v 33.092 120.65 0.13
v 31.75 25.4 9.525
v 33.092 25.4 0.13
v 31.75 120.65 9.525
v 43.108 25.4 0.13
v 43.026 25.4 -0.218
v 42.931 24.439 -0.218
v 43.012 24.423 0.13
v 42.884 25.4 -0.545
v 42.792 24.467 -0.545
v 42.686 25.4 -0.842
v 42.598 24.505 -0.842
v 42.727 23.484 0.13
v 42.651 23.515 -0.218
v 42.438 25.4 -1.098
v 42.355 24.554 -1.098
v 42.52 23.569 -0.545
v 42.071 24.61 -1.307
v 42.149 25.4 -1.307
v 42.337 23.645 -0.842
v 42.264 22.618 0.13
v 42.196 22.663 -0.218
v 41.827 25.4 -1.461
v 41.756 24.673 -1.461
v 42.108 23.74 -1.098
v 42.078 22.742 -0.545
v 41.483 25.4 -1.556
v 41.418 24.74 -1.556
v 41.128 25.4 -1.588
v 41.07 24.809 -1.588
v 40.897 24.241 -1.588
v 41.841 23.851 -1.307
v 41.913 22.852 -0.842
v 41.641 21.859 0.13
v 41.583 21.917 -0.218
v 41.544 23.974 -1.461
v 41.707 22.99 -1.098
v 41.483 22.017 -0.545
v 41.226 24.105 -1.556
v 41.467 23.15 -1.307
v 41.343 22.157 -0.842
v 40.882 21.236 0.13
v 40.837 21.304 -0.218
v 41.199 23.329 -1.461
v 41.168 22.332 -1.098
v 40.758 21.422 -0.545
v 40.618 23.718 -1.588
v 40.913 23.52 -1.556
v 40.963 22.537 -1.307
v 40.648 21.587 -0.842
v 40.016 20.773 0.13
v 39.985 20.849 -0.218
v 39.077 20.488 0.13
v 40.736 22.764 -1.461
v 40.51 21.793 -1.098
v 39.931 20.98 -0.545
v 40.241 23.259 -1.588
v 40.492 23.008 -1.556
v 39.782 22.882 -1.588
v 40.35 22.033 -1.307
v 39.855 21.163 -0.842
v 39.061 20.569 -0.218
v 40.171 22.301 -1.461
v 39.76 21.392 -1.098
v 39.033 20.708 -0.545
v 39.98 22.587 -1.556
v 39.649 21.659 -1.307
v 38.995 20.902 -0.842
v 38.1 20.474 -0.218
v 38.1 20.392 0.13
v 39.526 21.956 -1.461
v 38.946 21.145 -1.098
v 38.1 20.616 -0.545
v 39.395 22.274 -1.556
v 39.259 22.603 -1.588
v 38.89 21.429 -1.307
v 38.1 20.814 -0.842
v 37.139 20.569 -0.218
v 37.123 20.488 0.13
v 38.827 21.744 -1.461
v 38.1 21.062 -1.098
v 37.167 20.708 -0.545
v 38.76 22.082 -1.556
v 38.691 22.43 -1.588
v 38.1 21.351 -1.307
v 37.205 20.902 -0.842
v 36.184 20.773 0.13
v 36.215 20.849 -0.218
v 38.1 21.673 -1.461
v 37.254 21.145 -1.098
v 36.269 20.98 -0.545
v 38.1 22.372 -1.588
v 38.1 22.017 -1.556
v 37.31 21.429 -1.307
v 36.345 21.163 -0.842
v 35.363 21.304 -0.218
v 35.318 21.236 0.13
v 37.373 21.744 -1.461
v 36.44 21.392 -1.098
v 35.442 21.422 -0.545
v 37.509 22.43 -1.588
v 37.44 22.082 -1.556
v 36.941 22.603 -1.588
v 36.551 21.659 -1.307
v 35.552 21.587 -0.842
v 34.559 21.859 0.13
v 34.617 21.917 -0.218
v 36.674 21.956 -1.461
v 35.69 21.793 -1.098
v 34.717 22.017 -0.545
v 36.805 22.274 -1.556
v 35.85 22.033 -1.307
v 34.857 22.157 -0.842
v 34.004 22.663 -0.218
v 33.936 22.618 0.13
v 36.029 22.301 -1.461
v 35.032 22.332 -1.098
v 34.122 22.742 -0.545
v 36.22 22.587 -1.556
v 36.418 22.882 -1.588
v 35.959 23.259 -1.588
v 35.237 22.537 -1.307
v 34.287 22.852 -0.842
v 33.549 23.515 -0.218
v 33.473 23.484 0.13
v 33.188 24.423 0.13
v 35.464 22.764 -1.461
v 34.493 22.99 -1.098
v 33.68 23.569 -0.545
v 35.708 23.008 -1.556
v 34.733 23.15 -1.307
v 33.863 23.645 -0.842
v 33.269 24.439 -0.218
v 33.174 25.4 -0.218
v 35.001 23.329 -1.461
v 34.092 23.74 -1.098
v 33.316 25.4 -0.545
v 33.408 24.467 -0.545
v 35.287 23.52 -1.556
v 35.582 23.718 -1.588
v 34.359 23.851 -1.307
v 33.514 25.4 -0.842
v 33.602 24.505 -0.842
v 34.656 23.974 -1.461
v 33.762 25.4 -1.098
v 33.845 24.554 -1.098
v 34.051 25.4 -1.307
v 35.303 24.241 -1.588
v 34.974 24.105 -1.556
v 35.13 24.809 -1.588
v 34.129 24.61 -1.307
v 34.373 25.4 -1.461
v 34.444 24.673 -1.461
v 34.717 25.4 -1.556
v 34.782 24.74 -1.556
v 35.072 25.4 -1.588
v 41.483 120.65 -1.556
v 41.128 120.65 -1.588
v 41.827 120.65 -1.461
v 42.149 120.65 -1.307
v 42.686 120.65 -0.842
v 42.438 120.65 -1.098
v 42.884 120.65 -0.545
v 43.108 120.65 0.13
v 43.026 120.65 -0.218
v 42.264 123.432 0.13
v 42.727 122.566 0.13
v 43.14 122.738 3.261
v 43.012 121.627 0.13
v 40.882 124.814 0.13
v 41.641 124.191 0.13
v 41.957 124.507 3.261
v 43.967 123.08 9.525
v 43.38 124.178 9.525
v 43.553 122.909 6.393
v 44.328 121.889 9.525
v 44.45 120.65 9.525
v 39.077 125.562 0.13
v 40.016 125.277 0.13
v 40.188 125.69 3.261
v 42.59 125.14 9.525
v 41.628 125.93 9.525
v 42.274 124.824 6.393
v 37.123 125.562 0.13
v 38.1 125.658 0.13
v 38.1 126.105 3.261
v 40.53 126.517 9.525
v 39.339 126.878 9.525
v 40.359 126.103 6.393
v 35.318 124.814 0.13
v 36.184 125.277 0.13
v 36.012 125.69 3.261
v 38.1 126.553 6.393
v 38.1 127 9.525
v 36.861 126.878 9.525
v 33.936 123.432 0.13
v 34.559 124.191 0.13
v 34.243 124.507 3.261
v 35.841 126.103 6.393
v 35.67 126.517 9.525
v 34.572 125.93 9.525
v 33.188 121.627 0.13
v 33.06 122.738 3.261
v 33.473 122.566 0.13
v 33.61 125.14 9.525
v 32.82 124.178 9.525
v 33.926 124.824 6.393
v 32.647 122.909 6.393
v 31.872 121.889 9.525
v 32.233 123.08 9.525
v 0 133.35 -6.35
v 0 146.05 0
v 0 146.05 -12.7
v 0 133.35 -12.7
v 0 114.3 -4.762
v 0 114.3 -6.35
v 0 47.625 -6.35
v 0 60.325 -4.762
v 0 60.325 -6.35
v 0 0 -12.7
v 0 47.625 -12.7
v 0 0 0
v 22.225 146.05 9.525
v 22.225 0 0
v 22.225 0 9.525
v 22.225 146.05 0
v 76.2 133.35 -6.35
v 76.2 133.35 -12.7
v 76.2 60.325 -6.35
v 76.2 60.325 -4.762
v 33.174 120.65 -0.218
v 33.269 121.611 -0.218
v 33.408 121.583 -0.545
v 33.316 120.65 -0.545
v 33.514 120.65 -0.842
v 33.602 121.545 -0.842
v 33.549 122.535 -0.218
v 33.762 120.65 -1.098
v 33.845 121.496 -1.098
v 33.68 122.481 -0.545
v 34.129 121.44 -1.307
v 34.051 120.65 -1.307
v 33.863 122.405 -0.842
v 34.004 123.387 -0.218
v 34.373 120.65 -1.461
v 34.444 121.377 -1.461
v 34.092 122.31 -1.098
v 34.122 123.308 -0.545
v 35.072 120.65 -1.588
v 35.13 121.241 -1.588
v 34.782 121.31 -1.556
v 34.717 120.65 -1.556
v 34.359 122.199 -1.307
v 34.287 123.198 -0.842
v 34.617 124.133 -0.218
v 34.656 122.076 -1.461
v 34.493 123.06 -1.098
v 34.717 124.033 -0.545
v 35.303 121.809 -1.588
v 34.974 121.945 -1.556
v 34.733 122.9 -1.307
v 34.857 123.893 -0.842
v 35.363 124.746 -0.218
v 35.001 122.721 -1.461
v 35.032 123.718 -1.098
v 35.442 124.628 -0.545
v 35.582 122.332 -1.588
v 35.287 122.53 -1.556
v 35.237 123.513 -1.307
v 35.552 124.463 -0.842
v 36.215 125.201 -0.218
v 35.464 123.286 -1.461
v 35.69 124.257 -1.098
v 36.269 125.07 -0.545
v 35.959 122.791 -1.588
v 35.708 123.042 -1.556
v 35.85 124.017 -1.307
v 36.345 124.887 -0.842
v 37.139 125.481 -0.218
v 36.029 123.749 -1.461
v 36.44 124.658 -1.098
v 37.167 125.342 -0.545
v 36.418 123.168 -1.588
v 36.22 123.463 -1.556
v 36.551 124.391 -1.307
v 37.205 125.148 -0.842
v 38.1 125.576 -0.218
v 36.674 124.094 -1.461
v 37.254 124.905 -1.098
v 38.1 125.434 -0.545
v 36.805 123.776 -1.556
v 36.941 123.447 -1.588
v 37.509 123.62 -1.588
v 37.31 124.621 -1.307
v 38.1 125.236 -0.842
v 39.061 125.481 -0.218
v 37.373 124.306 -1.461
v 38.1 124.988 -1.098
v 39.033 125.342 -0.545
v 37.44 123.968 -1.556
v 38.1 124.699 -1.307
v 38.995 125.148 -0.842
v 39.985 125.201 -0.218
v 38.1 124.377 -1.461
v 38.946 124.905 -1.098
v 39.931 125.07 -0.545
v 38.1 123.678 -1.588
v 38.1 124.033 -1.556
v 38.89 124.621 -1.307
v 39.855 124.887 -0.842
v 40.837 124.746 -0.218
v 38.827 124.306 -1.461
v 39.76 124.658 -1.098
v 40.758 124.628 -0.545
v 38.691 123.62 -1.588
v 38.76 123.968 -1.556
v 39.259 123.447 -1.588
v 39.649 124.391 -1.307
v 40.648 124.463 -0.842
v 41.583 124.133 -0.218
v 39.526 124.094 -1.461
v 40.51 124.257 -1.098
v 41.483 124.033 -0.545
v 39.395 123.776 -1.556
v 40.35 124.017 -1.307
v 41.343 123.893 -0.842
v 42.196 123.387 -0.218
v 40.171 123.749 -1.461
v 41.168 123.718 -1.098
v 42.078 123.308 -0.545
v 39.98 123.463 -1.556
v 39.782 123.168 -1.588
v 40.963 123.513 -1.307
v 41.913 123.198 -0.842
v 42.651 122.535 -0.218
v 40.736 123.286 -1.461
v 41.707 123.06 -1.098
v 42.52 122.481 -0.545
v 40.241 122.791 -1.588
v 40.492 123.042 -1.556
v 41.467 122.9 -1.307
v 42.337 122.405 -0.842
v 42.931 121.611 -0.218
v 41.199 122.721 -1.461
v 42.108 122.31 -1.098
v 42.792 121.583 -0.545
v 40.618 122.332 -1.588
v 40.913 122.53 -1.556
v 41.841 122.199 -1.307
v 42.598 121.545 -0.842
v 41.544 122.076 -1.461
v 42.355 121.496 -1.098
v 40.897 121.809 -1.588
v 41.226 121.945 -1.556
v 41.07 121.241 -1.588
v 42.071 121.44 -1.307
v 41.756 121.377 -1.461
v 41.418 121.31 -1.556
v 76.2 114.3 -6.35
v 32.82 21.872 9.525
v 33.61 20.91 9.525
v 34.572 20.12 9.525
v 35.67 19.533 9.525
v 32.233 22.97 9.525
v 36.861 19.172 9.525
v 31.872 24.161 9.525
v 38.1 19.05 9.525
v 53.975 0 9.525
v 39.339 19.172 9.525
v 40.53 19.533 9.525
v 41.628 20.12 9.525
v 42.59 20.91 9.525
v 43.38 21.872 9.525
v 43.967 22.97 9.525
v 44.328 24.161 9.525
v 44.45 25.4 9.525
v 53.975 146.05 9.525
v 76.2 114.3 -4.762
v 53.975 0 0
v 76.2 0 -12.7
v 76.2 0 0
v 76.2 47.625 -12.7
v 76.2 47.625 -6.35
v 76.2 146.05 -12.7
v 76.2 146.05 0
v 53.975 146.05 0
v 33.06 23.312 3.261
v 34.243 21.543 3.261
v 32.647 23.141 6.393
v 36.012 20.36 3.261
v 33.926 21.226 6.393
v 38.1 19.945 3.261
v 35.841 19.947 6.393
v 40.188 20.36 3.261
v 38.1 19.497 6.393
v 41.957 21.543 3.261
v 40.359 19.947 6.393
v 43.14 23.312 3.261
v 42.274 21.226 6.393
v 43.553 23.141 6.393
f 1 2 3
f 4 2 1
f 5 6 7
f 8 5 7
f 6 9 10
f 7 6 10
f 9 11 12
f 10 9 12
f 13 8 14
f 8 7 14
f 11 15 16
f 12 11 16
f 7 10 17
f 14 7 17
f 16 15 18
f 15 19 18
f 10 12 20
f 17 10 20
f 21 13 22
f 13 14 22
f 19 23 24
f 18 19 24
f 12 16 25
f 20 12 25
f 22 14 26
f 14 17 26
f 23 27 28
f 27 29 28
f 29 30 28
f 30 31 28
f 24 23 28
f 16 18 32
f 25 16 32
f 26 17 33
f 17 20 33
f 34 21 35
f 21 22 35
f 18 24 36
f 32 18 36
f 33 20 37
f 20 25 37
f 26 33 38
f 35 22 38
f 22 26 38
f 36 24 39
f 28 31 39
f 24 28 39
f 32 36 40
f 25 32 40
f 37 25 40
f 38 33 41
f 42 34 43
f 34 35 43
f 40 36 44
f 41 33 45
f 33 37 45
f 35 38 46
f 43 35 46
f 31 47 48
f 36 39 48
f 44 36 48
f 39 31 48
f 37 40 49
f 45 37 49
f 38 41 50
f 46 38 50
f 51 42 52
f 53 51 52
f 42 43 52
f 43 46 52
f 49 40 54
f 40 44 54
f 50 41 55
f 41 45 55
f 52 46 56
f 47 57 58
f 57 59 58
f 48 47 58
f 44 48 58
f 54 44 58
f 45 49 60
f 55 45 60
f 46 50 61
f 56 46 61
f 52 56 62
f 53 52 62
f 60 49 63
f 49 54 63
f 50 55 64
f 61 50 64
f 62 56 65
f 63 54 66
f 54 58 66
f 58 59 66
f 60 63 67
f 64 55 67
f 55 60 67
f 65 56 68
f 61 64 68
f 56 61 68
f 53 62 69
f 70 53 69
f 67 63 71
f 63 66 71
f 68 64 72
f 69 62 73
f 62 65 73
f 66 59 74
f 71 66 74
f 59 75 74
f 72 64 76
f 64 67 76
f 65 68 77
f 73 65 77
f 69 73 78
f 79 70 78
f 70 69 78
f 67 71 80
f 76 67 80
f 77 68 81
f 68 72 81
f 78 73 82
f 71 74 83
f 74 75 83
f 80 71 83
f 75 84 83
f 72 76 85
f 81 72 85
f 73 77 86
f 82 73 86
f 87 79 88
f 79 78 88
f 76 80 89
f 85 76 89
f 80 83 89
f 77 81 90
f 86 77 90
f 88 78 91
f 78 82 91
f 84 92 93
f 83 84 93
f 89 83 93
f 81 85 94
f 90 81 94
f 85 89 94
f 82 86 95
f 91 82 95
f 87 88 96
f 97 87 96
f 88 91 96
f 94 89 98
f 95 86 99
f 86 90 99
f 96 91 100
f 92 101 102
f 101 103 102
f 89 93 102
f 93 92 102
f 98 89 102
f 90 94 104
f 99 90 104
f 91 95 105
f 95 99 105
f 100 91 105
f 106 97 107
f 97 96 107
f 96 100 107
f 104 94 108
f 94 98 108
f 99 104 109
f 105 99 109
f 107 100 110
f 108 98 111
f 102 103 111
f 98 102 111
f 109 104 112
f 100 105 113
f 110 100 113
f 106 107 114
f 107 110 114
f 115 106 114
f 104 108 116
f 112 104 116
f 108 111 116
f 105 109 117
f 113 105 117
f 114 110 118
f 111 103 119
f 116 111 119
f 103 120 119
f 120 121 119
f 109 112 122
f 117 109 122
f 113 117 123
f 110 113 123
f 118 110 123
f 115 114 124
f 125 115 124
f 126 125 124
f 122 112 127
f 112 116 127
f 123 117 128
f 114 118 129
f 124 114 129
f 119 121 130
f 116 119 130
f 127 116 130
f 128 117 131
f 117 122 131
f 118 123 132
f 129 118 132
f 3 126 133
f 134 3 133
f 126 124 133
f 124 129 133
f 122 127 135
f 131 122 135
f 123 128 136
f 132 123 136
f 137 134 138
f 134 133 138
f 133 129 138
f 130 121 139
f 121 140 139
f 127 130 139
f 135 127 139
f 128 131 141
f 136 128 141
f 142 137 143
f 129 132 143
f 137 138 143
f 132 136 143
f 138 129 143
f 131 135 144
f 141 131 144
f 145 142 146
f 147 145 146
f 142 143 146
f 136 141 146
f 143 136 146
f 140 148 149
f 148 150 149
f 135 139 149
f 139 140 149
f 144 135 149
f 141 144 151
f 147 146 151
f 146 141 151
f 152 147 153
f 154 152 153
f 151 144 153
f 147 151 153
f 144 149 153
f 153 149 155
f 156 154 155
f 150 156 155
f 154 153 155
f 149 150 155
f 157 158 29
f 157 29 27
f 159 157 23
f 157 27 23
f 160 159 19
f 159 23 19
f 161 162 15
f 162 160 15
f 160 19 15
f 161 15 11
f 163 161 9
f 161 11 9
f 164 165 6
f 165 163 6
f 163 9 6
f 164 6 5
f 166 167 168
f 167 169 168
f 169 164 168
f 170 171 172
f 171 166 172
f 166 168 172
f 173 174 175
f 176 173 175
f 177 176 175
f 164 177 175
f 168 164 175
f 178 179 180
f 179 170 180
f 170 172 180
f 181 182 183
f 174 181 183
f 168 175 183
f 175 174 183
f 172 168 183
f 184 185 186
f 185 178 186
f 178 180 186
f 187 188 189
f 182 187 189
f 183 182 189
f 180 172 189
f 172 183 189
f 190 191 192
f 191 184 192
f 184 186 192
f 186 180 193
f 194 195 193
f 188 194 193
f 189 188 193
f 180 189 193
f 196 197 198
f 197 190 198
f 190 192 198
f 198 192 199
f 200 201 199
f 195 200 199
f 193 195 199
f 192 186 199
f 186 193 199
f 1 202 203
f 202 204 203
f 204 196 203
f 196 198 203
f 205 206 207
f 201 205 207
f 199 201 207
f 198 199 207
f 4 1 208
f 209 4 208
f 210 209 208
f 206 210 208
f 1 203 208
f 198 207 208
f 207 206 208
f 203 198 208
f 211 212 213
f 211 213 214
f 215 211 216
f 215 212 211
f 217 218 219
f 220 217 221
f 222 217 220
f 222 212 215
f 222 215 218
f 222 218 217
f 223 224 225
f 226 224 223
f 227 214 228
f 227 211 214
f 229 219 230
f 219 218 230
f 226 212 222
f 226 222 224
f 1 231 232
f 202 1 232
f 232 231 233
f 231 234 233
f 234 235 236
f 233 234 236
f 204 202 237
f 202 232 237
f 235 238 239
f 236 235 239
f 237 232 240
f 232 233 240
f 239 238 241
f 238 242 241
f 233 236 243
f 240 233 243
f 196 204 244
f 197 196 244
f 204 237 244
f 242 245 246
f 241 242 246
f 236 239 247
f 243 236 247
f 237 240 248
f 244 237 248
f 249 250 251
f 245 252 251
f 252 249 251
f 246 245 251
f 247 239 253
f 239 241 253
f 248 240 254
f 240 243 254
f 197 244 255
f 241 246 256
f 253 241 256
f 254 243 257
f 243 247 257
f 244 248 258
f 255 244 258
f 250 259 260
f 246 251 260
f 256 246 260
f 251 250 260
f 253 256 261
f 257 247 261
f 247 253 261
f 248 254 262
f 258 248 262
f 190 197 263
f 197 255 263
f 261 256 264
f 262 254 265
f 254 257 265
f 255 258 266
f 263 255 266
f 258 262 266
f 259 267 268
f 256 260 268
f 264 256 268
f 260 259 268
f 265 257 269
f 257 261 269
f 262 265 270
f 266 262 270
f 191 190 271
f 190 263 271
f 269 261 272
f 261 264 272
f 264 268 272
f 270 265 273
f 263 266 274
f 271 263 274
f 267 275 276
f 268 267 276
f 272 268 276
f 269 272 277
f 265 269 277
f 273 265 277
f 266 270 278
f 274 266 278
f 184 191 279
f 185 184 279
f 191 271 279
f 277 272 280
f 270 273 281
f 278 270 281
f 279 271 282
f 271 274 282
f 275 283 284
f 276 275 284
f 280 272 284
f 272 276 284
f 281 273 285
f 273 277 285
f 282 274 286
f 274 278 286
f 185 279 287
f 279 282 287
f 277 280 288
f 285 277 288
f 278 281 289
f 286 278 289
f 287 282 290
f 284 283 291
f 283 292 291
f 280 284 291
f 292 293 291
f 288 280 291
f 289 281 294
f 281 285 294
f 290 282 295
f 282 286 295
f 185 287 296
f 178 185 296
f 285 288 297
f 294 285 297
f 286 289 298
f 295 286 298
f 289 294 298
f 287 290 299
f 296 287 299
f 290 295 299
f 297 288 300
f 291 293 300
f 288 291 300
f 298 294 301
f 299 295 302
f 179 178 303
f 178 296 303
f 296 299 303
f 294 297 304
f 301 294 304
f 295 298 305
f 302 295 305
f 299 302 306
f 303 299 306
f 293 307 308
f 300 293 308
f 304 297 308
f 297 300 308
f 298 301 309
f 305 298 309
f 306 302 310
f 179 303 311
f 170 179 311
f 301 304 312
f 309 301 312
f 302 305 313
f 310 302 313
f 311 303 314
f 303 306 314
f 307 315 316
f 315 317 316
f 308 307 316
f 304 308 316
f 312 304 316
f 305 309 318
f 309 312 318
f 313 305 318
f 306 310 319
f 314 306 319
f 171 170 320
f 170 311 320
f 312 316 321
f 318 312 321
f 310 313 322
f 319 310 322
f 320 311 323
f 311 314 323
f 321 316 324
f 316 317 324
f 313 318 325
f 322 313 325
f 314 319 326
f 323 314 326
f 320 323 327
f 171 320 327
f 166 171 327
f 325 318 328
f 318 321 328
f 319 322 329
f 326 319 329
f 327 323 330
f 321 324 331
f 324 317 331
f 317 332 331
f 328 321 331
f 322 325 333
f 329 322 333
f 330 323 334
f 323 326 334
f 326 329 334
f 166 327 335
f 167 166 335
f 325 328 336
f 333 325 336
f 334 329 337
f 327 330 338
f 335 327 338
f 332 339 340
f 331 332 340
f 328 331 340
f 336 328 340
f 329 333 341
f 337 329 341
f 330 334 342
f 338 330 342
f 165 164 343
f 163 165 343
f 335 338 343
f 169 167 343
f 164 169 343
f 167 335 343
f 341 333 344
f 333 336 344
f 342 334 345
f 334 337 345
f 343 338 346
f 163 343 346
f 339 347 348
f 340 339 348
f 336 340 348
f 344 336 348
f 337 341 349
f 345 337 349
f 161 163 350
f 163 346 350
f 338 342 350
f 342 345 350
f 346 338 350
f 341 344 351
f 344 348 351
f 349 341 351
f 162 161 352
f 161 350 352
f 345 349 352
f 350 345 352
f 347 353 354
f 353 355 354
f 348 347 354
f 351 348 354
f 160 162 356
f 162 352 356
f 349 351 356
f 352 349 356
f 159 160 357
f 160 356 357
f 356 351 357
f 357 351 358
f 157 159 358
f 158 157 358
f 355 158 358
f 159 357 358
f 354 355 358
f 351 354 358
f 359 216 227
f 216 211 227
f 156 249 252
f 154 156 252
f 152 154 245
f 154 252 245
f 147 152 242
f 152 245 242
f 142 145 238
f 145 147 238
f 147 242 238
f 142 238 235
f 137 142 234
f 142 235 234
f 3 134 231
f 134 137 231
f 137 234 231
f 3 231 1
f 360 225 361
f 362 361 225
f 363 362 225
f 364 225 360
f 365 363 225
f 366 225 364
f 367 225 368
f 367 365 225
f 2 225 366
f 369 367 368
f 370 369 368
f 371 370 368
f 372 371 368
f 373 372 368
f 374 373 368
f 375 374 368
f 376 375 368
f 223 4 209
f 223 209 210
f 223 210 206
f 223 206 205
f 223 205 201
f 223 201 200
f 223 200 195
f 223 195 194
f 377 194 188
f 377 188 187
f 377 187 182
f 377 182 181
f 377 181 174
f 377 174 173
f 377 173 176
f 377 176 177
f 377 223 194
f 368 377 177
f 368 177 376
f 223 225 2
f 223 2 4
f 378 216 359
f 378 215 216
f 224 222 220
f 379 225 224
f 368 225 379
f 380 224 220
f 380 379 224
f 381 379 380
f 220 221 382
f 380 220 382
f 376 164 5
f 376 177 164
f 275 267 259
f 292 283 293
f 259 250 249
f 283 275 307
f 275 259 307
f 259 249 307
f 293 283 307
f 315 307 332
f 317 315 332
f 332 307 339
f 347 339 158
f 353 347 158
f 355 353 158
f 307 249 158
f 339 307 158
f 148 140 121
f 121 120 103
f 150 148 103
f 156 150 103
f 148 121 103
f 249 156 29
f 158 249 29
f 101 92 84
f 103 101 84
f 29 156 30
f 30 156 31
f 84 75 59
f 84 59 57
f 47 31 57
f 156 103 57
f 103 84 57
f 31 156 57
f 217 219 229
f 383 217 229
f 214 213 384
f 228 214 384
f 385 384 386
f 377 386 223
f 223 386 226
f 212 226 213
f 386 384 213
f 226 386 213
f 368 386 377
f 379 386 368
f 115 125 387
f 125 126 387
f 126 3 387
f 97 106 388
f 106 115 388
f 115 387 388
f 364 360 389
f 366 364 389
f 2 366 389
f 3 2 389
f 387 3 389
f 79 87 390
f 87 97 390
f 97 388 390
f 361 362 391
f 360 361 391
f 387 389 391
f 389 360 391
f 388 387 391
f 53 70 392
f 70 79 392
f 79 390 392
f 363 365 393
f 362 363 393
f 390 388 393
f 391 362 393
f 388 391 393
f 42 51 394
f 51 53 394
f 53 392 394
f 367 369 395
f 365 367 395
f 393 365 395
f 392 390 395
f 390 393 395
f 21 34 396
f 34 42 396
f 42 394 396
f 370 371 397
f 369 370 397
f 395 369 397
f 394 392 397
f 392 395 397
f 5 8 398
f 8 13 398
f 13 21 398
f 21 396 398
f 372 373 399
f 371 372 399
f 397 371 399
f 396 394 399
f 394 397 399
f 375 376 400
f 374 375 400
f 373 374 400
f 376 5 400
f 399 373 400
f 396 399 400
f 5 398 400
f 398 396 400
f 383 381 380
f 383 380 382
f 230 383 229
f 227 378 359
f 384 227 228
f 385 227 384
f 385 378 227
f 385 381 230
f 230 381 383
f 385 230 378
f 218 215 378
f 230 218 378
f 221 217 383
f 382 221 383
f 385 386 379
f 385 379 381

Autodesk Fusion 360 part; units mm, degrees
sketch "Sketch1" plane through (0, 0, 0) normal (0, 0, 1) x (1, 0, 0)
  line L0 (0, 0) -> (76.2, 0)
  line L1 (76.2, 0) -> (76.2, 146.05)
  line L2 (76.2, 146.05) -> (0, 146.05)
  line L3 (0, 146.05) -> (0, 0)
  line L4 (22.225, 0) -> (22.225, 146.05)
  line L5 (53.975, 146.05) -> (53.975, 0)
  line L6 (0, 133.35) -> (76.2, 133.35)
  line L7 (0, 114.3) -> (76.2, 114.3)
  line L8 (0, 60.325) -> (76.2, 60.325)
  line L9 (0, 47.625) -> (76.2, 47.625)
  dimension "d1" = 76.2
  dimension "d2" = 146.05
  dimension "d3" = 22.225
  dimension "d4" = 22.225
  dimension "d5" = 12.7
  dimension "d6" = 19.05
  dimension "d7" = 12.7
  dimension "d8" = 85.725
extrude "Extrude1" add sketch "Sketch1" against normal blind 12.7 contours L0 L3 L4 L9 | L0 L4 L5 L9 | L0 L1 L5 L9 makes body 1
extrude "Extrude2" add sketch "Sketch1" against normal blind 12.7 separate body contours L2 L3 L4 L6 | L2 L4 L5 L6 | L1 L2 L5 L6 makes body 2
extrude "Extrude3" add sketch "Sketch1" along normal blind 9.525 separate body contours L0 L4 L5 L9 | L4 L5 L8 L9 | L4 L5 L7 L8 | L4 L5 L6 L7 | L2 L4 L5 L6 makes body 3
extrude "Extrude4" add sketch "Sketch1" against normal blind 6.35 separate body contours L3 L4 L6 L7 | L4 L5 L6 L7 | L1 L5 L6 L7 makes body 4
extrude "Extrude5" add sketch "Sketch1" against normal blind 6.35 separate body contours L3 L4 L8 L9 | L4 L5 L8 L9 | L1 L5 L8 L9 makes body 5
extrude "Extrude6" add sketch "Sketch1" against normal blind 4.7625 separate body contours L3 L4 L7 L8 | L4 L5 L7 L8 | L1 L5 L7 L8 makes body 6
ref_plane "WorkPlane1" through (22.225, 146.05, 9.525) normal (0, 0, -1) x (-1, 0, 0)
sketch "Sketch2" plane through (22.225, 146.05, 9.525) normal (0, 0, -1) x (1, 0, 0)
  line L0 (53.975, 0) -> (-22.225, 0)
  line L1 (53.975, 146.05) -> (53.975, 0)
  line L2 (-22.225, 146.05) -> (53.975, 146.05)
  line L3 (-22.225, 0) -> (-22.225, 146.05)
  line L4 (9.525, 25.4) -> (9.525, 120.65)
  line L5 (22.225, 120.65) -> (22.225, 25.4)
  arc A0 (22.225, 120.65) -> (9.525, 120.65) centre (15.875, 120.65) ccw
  arc A1 (9.525, 25.4) -> (22.225, 25.4) centre (15.875, 25.4) ccw
  dimension "d21" = 12.7
  dimension "d22" = 12.7
  dimension "d23" = 25.4
  dimension "d24" = 25.4
  dimension "d25" = 38.1
  dimension "d26" = 38.1
  dimension "d27" = 6.35
  dimension "d28" = 6.35
ref_plane "WorkPlane2" through (38.1, 73.025, -1.5875) normal (0, 0, -1) x (1, 0, 0)
sketch "Sketch3" plane through (38.1, 73.025, -1.5875) normal (0, 0, -1) x (1, 0, 0)
  line L0 (-6.35, -47.625) -> (-6.35, 47.625)
  arc A0 (-6.35, -47.625) -> (6.35, -47.625) centre (0, -47.625) ccw
  line L1 (6.35, 47.625) -> (6.35, -47.625)
  arc A1 (6.35, 47.625) -> (-6.35, 47.625) centre (0, 47.625) ccw
  line L2 (-4.7625, -47.625) -> (-4.7625, 47.625)
  arc A2 (4.7625, 47.625) -> (-4.7625, 47.625) centre (0, 47.625) ccw
  line L3 (4.7625, 47.625) -> (4.7625, -47.625)
  arc A3 (-4.7625, -47.625) -> (4.7625, -47.625) centre (0, -47.625) ccw
  dimension "d30" = 1.5875
loft "Loft1" cut profiles "Sketch3", "Sketch2" section 1 contours L2 A2 L3 A3 section 2 contours L4 L5 A0 A1 bodies 1 3 4 5 6
combine "Combine1" operation add target body 1 tool bodies 2 3 4 5 6
fillet "Fillet1" radius 2 7 edges at (42.8625, 53.975, -1.5875) (42.8625, 36.5125, -1.5875) (33.3375, 28.0546, -1.5875) (33.3375, 53.975, -1.5875) (33.3375, 87.3125, -1.5875) (38.1, 125.4124, -1.5875) (42.8625, 87.3125, -1.5875) on bodies 1
